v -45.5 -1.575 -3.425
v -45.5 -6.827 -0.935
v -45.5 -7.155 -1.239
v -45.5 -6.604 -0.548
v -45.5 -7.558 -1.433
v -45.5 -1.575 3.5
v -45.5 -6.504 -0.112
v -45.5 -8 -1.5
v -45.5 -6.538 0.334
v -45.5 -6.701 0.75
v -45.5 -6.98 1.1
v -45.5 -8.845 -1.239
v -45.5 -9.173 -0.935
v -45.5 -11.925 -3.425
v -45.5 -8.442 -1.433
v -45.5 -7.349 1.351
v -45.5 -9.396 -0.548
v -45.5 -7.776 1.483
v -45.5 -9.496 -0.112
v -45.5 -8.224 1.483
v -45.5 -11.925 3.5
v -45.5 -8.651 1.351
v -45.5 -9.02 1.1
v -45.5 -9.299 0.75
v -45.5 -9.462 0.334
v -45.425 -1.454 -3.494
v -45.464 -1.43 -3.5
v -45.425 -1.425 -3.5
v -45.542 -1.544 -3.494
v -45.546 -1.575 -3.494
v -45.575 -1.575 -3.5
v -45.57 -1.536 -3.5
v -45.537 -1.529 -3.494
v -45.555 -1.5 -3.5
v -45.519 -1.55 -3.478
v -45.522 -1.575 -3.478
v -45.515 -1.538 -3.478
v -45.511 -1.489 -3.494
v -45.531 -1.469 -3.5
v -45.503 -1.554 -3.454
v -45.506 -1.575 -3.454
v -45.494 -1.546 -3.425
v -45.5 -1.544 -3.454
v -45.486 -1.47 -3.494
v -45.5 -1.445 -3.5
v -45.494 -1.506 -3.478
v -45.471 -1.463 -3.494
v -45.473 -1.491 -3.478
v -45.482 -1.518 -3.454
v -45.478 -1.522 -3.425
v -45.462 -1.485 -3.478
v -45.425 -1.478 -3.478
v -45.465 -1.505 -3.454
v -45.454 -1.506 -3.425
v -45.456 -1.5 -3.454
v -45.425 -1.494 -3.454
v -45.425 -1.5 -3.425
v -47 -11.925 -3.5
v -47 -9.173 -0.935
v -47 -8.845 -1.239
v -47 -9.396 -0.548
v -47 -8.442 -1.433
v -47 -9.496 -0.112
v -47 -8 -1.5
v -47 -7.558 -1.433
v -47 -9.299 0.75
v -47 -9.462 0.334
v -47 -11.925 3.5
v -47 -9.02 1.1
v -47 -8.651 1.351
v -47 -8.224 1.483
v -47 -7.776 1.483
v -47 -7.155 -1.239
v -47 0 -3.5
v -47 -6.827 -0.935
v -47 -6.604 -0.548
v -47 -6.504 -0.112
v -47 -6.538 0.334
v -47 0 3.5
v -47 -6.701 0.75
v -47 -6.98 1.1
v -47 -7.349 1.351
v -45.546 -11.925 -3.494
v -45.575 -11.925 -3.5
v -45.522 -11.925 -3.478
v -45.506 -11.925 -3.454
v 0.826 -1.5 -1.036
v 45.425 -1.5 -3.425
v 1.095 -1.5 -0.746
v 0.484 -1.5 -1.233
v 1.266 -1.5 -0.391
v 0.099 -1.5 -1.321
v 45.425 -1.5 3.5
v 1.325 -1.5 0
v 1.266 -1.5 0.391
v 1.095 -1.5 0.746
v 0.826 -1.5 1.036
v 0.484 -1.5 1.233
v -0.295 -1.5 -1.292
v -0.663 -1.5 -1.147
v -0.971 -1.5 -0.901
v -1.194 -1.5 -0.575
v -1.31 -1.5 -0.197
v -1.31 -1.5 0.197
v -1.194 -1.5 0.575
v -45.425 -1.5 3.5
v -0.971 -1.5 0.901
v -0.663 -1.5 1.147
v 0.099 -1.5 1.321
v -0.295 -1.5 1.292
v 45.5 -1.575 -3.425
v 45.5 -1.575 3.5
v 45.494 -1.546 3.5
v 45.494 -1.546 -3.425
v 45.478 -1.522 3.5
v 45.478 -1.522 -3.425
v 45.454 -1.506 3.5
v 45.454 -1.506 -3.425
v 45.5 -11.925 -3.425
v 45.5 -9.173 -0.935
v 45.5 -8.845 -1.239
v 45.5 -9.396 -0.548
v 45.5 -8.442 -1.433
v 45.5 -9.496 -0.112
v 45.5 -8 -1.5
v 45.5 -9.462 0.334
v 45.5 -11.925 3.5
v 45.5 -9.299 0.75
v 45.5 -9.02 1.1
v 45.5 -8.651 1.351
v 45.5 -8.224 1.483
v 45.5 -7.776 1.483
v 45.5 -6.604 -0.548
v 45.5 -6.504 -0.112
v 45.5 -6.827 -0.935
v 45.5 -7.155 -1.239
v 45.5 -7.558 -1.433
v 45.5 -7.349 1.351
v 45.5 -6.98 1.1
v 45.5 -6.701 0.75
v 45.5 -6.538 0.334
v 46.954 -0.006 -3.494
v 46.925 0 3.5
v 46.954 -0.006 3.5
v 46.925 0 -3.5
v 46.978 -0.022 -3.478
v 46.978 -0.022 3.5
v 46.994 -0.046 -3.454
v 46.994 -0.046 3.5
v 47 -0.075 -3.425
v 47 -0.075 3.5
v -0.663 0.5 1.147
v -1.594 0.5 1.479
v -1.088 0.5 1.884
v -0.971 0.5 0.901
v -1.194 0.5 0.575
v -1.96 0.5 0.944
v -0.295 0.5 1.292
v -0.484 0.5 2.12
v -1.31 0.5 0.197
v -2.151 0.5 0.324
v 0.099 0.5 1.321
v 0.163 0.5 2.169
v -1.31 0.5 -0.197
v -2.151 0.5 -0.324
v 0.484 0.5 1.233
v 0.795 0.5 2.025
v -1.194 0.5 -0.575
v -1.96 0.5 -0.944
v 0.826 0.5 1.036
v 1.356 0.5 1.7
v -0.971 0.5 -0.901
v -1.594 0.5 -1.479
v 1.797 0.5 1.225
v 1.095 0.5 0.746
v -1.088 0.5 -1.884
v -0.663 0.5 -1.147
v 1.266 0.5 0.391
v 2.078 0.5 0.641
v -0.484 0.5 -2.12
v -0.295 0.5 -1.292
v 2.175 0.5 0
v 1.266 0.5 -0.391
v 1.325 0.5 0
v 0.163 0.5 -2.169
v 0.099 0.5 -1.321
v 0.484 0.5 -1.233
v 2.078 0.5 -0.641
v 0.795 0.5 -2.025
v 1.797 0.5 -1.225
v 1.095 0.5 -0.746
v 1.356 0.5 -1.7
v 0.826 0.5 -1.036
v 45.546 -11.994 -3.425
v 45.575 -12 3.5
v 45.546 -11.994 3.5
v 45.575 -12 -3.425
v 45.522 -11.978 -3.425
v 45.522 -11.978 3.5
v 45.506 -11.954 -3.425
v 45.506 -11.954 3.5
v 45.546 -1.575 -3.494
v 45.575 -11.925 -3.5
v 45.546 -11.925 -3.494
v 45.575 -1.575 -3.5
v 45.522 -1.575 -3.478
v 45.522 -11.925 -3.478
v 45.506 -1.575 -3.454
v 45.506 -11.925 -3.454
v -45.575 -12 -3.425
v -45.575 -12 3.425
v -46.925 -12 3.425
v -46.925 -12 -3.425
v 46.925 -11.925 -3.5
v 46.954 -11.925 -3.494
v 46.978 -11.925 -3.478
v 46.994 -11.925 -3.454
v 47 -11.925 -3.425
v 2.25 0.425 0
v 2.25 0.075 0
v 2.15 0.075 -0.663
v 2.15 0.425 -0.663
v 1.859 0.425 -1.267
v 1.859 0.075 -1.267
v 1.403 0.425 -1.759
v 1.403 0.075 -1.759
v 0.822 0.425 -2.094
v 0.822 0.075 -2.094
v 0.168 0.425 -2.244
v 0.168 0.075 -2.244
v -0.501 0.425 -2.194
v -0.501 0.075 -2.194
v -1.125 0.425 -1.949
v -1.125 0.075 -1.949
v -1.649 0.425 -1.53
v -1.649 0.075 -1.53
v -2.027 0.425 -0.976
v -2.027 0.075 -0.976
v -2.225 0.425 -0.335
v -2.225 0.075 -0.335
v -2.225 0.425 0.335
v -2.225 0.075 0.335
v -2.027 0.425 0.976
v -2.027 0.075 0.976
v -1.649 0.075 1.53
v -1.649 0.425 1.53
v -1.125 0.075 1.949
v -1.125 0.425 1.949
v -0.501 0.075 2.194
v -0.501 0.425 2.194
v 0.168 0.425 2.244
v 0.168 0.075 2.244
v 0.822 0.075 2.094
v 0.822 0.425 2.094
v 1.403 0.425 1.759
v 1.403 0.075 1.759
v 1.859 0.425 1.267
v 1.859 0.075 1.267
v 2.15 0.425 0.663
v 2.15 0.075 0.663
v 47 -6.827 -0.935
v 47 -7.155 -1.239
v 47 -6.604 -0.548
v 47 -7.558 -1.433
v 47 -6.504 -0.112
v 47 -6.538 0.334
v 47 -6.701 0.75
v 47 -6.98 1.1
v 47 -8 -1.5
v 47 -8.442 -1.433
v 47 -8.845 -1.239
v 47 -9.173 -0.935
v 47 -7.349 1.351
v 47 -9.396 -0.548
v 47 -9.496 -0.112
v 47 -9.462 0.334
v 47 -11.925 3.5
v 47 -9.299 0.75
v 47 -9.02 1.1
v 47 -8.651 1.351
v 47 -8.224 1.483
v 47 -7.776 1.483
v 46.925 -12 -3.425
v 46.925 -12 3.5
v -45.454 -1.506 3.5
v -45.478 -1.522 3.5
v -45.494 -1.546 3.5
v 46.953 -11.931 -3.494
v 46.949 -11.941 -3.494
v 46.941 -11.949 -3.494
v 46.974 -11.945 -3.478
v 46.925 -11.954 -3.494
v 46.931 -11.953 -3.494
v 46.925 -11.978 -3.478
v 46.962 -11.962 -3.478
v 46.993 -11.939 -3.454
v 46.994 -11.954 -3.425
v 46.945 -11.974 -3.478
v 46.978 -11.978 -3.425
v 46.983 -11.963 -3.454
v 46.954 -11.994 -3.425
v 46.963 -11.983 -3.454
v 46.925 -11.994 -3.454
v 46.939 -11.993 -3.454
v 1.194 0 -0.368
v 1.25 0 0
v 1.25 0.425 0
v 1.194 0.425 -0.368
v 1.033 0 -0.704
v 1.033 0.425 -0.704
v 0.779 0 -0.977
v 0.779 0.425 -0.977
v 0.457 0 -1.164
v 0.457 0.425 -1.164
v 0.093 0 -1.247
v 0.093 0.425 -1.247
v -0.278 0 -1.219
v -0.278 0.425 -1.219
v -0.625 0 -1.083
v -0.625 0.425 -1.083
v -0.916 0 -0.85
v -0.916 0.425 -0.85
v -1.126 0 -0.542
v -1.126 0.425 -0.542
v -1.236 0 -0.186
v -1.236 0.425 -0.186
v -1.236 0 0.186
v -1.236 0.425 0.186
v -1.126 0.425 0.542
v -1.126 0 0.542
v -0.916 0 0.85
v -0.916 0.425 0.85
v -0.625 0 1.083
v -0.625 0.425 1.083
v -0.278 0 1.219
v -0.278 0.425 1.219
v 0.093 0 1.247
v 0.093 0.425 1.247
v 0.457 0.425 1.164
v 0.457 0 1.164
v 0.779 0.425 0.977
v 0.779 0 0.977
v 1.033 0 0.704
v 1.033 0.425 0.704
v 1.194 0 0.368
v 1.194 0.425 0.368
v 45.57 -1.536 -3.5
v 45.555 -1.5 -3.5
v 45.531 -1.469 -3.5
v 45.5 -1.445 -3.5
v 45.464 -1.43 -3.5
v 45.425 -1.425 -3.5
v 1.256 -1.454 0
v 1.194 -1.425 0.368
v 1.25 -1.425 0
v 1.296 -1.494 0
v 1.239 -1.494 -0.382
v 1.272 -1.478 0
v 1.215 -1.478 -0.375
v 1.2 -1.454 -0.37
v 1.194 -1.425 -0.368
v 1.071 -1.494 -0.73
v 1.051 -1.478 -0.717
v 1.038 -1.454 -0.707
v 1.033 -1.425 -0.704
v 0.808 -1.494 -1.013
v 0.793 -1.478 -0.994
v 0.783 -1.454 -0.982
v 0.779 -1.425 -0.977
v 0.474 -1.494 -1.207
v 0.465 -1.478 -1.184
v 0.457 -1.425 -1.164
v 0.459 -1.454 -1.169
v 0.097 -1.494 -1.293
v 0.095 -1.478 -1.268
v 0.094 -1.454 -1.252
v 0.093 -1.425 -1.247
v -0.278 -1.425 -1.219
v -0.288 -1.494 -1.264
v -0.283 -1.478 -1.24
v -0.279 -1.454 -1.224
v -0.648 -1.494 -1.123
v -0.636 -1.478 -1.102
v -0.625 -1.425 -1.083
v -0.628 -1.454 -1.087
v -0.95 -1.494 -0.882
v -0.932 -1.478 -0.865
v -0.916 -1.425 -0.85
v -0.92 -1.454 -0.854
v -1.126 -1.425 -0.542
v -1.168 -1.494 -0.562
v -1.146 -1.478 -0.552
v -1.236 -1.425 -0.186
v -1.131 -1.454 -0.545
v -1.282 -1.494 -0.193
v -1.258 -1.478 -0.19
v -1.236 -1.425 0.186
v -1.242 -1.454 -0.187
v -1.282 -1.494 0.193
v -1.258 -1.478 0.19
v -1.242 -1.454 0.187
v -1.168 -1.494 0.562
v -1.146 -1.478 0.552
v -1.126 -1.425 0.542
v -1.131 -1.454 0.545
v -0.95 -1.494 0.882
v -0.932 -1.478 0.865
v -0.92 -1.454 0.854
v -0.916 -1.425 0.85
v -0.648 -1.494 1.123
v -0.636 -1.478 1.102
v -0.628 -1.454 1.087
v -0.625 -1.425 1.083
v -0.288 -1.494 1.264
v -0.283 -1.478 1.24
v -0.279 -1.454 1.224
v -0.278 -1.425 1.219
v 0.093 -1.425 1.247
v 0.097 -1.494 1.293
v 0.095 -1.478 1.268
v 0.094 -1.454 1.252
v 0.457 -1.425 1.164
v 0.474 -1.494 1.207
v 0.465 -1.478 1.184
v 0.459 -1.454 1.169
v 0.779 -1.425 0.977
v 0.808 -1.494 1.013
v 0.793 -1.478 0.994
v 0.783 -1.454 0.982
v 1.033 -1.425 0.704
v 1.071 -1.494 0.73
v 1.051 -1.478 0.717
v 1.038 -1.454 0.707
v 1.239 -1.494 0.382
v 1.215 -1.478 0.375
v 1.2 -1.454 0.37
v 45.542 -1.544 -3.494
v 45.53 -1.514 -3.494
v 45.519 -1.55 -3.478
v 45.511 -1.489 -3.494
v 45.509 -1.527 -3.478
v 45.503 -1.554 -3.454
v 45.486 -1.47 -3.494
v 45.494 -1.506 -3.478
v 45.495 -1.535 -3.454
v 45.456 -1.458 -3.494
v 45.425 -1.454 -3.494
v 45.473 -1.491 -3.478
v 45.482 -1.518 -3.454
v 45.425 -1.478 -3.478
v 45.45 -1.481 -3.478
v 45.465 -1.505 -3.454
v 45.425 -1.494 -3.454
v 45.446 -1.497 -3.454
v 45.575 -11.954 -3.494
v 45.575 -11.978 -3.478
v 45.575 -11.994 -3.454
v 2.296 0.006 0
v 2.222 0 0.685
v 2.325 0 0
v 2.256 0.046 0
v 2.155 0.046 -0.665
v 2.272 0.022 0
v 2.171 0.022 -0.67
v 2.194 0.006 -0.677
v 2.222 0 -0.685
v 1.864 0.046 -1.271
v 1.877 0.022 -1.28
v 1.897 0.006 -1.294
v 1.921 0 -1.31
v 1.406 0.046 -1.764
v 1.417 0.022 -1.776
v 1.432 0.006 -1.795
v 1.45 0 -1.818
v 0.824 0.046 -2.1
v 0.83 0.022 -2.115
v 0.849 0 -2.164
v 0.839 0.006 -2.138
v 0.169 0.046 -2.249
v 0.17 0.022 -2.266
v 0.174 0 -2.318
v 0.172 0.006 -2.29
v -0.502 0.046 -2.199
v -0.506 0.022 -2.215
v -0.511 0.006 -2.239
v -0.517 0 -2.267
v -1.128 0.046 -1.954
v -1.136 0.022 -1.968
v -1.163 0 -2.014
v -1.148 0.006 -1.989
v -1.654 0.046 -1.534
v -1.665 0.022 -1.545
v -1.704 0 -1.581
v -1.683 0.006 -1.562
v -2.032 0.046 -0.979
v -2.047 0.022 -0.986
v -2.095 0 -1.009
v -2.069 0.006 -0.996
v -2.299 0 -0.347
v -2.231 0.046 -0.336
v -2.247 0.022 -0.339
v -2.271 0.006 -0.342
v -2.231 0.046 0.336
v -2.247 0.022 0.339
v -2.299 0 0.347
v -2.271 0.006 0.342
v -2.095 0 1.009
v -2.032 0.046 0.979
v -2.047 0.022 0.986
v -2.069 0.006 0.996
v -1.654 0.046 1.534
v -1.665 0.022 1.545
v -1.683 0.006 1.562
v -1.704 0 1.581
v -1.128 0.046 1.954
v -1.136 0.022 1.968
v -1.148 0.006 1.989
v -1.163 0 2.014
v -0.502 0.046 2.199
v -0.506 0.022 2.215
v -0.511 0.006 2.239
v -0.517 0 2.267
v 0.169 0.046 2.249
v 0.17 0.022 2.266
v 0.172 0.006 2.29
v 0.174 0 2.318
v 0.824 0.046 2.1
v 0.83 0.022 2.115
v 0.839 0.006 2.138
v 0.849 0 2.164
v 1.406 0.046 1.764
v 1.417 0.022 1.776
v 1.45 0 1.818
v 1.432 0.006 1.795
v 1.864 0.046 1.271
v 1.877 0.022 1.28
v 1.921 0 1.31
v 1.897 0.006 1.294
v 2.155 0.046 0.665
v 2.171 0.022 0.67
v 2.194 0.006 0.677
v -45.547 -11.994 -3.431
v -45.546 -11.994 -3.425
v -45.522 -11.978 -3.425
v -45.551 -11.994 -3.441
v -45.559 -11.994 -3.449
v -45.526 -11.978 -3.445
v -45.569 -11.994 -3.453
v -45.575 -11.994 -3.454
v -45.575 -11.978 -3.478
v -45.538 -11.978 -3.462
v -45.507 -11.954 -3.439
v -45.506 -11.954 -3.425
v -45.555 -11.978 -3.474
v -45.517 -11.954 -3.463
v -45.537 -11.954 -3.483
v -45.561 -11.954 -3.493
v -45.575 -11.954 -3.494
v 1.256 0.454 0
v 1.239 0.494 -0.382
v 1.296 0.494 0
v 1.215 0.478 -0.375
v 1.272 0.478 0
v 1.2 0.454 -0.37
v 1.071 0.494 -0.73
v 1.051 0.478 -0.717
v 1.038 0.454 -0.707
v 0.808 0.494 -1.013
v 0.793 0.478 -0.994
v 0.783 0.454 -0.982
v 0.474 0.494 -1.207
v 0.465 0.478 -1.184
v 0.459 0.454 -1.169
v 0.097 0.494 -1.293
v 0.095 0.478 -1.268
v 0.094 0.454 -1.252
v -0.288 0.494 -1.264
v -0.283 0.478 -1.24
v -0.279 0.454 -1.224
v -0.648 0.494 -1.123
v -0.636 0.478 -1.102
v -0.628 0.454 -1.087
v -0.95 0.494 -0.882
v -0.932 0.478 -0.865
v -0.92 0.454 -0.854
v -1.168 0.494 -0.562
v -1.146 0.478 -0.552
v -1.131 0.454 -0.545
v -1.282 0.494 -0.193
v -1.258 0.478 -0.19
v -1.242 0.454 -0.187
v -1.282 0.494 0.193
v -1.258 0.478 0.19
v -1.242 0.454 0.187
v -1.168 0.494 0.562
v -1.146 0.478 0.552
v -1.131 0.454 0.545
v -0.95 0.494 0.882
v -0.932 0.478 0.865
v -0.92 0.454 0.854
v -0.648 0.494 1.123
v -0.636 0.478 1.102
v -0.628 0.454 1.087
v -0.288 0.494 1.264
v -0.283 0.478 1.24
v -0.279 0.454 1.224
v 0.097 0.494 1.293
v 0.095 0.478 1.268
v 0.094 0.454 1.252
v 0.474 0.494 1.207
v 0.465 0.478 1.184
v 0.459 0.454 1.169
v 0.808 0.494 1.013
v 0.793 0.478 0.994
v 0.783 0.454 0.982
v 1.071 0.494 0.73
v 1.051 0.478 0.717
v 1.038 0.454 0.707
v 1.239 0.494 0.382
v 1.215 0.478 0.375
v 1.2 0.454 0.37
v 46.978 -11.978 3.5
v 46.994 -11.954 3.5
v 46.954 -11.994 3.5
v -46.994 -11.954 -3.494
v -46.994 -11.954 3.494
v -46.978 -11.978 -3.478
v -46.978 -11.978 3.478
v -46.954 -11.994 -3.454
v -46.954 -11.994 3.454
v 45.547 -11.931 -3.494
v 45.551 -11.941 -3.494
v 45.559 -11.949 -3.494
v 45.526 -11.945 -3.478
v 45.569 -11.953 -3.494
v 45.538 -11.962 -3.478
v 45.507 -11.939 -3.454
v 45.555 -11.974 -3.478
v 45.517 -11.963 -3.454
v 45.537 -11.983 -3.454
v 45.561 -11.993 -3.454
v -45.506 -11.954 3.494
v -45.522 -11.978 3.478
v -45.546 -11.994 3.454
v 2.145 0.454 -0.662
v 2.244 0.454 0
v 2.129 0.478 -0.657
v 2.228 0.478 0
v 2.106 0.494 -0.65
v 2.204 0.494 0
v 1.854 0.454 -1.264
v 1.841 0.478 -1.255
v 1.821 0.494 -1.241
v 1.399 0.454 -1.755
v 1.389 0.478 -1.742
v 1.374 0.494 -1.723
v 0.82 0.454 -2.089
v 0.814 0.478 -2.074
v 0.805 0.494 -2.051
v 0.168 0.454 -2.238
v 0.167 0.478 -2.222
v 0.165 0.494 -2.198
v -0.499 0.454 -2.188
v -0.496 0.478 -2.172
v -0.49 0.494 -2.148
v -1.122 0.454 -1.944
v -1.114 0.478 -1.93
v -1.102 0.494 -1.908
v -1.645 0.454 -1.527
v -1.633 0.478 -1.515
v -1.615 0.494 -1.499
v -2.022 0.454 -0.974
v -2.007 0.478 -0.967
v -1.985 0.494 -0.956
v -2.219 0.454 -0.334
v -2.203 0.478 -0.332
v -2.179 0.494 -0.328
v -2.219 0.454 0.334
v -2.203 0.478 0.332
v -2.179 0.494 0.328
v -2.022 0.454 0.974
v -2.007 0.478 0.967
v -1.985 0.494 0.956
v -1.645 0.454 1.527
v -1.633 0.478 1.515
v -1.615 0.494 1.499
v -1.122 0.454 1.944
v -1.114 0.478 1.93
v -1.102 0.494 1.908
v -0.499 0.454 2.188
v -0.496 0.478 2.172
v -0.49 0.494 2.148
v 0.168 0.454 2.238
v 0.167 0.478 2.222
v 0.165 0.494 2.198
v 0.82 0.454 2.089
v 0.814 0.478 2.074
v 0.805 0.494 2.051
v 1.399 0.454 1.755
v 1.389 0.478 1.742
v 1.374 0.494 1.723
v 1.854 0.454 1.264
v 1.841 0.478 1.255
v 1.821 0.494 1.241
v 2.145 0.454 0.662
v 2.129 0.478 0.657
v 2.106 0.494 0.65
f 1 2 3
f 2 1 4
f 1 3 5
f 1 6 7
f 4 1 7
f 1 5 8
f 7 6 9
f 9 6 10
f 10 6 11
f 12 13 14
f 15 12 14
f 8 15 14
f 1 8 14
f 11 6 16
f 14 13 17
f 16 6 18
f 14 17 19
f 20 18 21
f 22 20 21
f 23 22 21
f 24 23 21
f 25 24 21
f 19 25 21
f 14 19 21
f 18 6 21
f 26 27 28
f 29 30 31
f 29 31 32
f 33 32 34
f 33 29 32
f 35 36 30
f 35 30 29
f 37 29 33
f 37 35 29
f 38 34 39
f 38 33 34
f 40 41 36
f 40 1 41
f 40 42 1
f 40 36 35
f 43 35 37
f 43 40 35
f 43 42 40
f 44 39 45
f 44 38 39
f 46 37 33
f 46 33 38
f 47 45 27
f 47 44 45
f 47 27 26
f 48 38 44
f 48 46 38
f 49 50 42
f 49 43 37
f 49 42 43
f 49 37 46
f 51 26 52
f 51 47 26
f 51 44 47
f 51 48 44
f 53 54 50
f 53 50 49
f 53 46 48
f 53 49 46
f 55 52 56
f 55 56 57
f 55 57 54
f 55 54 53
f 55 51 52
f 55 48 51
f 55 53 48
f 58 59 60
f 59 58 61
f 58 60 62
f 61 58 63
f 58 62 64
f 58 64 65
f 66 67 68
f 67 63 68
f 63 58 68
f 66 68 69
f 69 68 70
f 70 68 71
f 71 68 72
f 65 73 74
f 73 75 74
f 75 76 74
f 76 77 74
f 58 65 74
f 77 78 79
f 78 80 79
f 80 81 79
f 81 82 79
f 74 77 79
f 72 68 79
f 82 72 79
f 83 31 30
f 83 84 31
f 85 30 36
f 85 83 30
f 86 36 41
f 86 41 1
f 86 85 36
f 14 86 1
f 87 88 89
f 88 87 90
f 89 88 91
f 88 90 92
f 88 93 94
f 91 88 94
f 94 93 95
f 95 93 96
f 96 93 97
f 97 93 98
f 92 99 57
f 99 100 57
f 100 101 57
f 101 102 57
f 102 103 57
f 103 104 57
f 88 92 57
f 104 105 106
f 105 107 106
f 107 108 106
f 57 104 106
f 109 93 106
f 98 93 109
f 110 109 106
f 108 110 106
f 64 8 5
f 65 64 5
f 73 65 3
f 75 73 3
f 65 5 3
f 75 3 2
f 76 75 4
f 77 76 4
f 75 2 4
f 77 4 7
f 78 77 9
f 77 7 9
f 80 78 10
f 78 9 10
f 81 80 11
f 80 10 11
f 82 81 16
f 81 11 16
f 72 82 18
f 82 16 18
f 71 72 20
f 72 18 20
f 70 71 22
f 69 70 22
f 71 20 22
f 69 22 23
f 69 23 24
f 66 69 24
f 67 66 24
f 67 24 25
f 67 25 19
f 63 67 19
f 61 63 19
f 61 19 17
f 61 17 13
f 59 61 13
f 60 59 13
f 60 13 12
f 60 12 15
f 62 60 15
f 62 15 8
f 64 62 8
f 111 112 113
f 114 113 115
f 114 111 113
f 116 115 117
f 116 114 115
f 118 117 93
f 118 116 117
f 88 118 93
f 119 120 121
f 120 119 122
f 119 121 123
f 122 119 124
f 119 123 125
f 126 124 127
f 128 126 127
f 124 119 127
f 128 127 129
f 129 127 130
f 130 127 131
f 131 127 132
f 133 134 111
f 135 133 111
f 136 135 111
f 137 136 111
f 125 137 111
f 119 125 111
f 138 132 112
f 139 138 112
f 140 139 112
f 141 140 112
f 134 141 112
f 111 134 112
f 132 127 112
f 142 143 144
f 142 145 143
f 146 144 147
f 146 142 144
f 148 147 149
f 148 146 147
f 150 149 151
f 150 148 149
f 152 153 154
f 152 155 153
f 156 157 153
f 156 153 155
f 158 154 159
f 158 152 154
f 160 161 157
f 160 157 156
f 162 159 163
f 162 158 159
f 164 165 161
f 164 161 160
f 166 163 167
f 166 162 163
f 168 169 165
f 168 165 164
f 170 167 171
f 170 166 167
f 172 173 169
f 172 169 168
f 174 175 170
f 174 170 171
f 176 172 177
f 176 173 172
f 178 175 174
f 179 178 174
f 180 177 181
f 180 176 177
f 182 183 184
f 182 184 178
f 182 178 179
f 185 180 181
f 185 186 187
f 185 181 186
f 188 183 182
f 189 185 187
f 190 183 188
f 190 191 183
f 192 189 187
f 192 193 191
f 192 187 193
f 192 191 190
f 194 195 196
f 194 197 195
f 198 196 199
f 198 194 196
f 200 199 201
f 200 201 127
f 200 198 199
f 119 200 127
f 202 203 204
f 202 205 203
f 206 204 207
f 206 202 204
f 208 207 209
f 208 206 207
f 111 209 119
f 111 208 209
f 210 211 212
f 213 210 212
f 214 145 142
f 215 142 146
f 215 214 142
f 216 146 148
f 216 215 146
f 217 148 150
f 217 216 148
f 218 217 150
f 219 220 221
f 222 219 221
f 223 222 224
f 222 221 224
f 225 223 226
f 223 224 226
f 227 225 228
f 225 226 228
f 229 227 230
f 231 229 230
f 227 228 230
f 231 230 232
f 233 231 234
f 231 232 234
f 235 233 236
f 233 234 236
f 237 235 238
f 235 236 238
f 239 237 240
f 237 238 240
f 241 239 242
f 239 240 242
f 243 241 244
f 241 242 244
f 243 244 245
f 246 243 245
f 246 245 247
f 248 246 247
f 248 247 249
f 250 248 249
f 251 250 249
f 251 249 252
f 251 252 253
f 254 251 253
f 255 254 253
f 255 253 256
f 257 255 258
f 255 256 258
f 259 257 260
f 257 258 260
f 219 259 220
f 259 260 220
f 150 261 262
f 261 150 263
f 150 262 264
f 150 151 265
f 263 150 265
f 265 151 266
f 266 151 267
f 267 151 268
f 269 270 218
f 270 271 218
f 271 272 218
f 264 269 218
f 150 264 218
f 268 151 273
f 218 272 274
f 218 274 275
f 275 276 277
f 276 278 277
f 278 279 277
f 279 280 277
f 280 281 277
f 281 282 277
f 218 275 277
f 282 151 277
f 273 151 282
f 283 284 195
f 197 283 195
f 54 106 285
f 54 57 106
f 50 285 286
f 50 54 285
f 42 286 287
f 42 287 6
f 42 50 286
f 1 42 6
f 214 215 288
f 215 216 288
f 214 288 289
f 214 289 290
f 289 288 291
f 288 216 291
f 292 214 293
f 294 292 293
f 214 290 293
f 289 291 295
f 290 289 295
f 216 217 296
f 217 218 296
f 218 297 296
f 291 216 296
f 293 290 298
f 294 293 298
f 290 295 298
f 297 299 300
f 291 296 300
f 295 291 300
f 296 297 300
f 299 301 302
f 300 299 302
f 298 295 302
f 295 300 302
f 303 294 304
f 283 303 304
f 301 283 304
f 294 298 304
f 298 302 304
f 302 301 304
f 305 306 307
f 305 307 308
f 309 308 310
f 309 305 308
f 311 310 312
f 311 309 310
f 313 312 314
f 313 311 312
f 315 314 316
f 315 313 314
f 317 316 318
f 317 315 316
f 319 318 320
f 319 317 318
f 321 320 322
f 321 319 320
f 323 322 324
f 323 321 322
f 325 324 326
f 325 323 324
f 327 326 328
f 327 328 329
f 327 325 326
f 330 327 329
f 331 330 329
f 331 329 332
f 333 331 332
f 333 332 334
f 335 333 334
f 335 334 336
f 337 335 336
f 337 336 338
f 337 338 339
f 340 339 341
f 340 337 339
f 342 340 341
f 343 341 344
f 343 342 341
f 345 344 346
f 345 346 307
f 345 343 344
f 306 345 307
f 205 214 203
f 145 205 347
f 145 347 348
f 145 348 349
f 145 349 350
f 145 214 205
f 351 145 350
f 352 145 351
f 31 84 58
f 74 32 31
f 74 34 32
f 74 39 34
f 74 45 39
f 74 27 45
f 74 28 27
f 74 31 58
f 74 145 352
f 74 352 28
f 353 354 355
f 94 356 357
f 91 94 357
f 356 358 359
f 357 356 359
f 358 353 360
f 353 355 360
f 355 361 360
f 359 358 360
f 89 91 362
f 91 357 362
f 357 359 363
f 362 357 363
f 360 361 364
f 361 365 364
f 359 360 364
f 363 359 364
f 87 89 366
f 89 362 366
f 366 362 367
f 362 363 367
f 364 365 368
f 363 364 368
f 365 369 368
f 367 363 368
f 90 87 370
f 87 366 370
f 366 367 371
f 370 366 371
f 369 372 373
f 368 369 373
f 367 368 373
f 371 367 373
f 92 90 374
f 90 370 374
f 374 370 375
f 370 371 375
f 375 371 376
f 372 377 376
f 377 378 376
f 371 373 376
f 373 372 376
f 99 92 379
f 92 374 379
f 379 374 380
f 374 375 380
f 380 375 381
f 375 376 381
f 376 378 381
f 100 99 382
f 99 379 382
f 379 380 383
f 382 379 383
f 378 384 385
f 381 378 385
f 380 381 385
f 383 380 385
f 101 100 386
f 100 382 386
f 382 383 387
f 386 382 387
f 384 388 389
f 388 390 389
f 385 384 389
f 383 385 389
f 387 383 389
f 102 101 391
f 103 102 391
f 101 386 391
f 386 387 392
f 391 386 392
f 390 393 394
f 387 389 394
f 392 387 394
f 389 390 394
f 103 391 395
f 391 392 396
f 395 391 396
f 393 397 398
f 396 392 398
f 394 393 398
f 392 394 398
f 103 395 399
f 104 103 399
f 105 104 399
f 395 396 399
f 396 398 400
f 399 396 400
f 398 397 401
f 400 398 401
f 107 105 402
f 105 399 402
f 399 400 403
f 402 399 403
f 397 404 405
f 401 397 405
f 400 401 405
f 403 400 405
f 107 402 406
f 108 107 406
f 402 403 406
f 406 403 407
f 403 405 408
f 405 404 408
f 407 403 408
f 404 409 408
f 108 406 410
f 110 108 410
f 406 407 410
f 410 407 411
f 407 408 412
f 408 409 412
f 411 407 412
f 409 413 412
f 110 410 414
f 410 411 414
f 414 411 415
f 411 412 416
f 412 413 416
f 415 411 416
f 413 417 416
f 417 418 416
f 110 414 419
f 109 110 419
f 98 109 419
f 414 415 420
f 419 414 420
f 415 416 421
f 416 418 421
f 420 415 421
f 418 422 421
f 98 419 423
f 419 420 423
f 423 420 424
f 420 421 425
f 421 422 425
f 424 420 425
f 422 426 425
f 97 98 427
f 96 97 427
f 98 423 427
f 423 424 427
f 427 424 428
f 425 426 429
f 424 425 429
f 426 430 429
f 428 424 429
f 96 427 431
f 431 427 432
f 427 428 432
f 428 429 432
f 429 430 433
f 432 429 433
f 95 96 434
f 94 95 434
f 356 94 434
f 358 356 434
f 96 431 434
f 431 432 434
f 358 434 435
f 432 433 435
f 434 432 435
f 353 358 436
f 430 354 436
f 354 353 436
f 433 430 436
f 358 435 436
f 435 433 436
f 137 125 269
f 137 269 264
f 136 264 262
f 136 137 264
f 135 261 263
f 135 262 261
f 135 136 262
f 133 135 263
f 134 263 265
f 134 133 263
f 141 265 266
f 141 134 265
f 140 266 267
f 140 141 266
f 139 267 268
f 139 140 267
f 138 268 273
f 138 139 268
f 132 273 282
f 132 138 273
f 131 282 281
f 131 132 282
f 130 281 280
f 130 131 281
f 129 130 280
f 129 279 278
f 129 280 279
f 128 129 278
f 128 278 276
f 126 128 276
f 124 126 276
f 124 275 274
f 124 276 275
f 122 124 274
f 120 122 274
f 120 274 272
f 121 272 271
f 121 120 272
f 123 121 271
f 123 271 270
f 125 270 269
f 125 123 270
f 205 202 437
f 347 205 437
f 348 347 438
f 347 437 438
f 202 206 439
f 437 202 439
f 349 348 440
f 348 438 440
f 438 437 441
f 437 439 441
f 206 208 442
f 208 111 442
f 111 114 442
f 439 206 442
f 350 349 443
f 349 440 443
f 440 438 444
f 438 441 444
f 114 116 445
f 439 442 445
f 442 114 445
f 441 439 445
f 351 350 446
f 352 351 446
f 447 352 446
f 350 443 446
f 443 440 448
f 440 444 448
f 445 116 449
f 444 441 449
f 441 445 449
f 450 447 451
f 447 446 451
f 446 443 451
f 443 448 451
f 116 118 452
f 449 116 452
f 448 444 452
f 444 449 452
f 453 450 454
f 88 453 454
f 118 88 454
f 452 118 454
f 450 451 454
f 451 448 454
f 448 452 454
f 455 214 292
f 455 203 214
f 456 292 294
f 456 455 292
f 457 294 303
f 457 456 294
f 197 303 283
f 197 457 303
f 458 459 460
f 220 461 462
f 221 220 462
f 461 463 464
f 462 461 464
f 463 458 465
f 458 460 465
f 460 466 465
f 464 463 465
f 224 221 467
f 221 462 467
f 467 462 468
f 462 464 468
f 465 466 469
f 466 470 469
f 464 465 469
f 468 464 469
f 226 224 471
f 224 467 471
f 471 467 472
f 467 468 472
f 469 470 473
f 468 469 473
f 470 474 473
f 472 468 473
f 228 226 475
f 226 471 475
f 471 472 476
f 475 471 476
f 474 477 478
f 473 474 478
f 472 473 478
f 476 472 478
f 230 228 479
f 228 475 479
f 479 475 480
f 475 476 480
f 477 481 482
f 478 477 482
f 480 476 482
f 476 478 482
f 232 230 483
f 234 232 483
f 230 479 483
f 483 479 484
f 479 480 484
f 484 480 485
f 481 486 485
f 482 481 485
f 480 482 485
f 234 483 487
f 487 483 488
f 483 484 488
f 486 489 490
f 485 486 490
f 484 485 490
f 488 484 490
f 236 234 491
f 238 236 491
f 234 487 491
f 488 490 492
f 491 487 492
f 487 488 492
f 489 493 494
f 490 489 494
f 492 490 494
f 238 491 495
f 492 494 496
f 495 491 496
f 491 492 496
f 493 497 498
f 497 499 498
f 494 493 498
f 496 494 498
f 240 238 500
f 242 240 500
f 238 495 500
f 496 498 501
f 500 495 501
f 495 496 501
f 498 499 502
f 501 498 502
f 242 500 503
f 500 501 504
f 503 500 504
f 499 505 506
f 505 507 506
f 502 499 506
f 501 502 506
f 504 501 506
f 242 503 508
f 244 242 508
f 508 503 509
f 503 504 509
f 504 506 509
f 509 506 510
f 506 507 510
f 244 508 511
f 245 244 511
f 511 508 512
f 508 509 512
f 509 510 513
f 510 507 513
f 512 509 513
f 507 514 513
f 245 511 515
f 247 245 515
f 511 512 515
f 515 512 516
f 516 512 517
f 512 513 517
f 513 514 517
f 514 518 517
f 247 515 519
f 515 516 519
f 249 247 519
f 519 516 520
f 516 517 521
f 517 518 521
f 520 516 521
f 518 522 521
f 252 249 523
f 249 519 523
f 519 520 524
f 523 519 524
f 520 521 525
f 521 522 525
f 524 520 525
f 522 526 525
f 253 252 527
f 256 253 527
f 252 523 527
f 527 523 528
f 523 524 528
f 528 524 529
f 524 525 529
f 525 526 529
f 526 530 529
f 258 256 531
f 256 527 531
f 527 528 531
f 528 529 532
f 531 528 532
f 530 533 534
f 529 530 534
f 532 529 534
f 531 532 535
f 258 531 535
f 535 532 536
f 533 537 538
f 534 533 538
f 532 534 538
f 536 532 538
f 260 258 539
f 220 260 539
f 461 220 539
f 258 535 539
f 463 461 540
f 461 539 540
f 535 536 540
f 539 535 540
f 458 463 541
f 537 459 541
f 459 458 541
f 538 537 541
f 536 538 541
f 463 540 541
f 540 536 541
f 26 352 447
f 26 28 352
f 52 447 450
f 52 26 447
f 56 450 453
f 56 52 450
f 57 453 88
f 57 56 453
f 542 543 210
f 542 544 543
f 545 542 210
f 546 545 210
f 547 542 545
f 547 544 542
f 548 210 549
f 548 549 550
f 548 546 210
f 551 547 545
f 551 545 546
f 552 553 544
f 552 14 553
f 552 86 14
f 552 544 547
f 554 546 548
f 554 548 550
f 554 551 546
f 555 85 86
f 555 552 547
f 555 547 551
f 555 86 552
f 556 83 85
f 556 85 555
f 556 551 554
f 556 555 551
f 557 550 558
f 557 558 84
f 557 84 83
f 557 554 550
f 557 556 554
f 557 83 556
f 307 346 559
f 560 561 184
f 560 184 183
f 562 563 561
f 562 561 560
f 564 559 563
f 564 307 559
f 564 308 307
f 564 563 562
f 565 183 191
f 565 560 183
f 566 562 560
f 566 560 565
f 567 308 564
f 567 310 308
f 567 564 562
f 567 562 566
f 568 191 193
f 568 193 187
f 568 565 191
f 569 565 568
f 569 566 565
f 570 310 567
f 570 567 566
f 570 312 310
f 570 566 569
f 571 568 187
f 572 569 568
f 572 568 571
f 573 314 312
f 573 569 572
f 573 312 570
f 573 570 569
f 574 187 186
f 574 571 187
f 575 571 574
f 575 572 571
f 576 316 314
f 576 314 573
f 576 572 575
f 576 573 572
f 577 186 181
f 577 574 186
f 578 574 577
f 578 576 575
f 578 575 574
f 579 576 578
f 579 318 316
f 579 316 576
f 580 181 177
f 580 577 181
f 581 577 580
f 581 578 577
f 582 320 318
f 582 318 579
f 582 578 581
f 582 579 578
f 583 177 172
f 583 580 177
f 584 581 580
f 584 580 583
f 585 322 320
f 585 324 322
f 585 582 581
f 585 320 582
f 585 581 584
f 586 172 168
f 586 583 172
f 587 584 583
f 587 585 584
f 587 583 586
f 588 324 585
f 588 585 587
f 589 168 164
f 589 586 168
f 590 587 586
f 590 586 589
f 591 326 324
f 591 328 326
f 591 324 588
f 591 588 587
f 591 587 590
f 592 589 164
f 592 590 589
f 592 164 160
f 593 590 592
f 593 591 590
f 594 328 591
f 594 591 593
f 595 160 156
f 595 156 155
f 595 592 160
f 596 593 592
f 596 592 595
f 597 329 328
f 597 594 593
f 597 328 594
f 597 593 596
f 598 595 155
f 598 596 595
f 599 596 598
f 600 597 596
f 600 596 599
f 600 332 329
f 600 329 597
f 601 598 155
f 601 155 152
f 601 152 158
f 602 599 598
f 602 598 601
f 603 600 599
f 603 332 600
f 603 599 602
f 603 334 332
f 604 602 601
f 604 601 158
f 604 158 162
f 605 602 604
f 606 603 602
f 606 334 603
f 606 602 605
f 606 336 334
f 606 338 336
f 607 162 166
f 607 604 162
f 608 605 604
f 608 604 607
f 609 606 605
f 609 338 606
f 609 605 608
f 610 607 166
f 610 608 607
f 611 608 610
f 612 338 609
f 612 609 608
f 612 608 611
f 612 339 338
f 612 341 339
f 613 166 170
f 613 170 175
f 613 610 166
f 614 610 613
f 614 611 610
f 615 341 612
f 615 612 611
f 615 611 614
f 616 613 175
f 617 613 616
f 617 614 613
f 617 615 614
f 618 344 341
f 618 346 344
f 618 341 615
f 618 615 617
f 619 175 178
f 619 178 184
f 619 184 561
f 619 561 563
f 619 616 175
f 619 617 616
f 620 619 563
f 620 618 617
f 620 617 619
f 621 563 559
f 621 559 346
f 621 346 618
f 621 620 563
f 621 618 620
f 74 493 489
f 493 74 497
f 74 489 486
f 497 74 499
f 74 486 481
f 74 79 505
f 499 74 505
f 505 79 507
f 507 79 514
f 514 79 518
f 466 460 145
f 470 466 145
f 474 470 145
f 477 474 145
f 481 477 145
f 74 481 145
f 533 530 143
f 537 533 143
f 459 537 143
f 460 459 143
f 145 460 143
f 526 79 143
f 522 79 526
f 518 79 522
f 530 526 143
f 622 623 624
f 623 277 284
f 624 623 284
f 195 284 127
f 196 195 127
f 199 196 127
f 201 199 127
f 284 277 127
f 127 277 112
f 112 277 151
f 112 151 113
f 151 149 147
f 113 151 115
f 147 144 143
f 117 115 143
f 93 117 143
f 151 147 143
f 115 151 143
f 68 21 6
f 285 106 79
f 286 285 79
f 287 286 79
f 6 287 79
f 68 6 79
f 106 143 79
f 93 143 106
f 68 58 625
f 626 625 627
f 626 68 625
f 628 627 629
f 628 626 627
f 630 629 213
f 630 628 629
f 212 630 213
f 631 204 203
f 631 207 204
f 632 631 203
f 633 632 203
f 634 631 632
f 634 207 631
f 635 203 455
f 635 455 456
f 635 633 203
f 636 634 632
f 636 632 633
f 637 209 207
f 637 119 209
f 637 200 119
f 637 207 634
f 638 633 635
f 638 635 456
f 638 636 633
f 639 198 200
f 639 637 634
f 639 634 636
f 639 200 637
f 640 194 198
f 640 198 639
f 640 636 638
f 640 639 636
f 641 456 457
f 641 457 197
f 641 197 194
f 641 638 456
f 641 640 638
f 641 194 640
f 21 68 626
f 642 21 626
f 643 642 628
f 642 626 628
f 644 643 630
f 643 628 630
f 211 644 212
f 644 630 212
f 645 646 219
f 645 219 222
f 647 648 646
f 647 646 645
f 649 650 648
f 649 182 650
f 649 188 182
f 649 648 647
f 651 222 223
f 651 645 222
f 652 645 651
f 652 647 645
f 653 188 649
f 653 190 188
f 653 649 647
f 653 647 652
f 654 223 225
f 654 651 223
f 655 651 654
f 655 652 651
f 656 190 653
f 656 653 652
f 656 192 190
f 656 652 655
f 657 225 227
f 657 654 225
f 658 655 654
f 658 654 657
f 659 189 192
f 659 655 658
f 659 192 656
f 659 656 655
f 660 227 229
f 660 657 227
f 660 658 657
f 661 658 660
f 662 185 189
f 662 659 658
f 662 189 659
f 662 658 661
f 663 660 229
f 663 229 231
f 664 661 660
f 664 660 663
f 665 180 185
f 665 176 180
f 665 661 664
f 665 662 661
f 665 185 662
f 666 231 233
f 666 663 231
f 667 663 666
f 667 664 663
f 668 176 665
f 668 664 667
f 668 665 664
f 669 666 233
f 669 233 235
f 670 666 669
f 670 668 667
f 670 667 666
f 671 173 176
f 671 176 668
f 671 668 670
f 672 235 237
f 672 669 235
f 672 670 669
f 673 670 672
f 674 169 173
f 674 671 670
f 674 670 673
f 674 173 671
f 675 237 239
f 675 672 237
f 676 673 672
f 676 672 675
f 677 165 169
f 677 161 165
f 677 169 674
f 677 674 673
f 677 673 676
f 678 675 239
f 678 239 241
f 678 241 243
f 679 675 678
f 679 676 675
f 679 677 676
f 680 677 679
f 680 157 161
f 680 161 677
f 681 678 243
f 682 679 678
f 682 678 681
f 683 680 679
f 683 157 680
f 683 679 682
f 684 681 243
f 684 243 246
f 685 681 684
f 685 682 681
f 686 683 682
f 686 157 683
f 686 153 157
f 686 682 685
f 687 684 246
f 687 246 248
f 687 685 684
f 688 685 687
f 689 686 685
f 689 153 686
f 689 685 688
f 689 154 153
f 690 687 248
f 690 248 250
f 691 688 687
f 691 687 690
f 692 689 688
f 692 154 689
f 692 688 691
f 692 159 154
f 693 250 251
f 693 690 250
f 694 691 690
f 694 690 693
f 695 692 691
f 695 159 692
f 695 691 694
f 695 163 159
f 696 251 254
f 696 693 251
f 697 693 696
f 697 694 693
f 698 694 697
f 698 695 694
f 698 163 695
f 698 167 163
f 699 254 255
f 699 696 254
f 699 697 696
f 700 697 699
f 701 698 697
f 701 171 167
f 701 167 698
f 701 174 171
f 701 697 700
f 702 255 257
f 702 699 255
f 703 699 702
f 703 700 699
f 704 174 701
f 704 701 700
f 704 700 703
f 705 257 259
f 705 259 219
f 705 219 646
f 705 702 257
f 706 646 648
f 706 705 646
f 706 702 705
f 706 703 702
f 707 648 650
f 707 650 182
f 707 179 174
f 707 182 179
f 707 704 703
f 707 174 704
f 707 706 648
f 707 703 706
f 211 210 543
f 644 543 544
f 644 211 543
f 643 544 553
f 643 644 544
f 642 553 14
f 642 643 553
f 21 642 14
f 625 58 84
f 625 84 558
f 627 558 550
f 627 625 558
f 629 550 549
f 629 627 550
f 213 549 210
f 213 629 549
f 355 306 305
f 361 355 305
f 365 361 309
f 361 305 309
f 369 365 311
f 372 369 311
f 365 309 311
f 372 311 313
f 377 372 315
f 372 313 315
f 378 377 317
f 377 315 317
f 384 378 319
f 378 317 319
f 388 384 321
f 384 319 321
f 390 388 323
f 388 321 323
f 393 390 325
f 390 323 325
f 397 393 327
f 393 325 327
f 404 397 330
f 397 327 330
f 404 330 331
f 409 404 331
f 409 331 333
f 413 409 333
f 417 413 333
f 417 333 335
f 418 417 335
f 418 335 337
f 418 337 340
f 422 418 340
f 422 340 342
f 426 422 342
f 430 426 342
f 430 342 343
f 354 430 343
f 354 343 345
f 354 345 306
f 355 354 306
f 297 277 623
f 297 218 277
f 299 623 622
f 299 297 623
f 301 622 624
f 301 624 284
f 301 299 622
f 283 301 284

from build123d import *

# Parameters (mm, degrees)
BOSS_EXTRUDE1_DEPTH     = 3.5
SKETCH2_R               = 1.25
CUT_EXTRUDE1_DEPTH      = 13
SKETCH3_R               = 2.25
SKETCH3_R_2             = 1.25
BOSS_EXTRUDE2_DEPTH     = 0.5
SKETCH4_R               = 1.5
CUT_EXTRUDE2_DEPTH      = 48
CUT_EXTRUDE2_DEPTH_BACK = 48
FILLET1_R               = 0.075


with BuildPart() as part:
    # Sketch1 → Boss-Extrude1 (new body, symmetric)
    with BuildSketch(Plane.XY):
        Polygon((-47, 0), (47, 0), (47, -12), (45.5, -12), (45.5, -1.5), (-45.5, -1.5), (-45.5, -12), (-47, -12), align=None)
    extrude(amount=BOSS_EXTRUDE1_DEPTH, both=True)

    # Sketch2 → Cut-Extrude1 (cut, through all)
    with BuildSketch(Plane(origin=(0, 0, 0), x_dir=(1, 0, 0), z_dir=(0, 1, 0))):
        Circle(SKETCH2_R)
    extrude(amount=-CUT_EXTRUDE1_DEPTH, mode=Mode.SUBTRACT)

    # Sketch3 → Boss-Extrude2 (add)
    with BuildSketch(Plane(origin=(0, 0, 0), x_dir=(1, 0, 0), z_dir=(0, 1, 0))):
        Circle(SKETCH3_R)
        Circle(SKETCH3_R_2, mode=Mode.SUBTRACT)
    extrude(amount=BOSS_EXTRUDE2_DEPTH)

    # Sketch4 → Cut-Extrude2 (cut, two sides)
    with BuildSketch(Plane(origin=(0, 0, 0), x_dir=(0, 0, -1), z_dir=(1, 0, 0))) as cut_extrude2_sk:
        with Locations((0, -8)):
            Circle(SKETCH4_R)
    extrude(amount=CUT_EXTRUDE2_DEPTH, mode=Mode.SUBTRACT)
    extrude(cut_extrude2_sk.sketch, amount=-CUT_EXTRUDE2_DEPTH_BACK, mode=Mode.SUBTRACT)

    # Fillet1
    fillet1_edges = [part.edges().sort_by_distance(p)[0] for p in [
        (-45.5, -6.75, -3.5),
        (0, -1.5, -3.5),
        (-2.25, 0, 0),
        (47, -12, 0),
        (47, 0, 0),
        (-47, -12, 0),
        (-45.5, -12, 0),
        (-45.5, -1.5, 0),
        (45.5, -1.5, 0),
        (45.5, -12, 0),
        (-46.25, -12, 3.5),
        (45.5, -6.75, -3.5),
        (-46.25, -12, -3.5),
        (47, -6, -3.5),
        (46.25, -12, -3.5),
        (-1.25, -1.5, 0),
        (-2.25, 0.5, 0),
        (-1.25, 0.5, 0),
    ]]
    fillet(fillet1_edges, radius=FILLET1_R)


solid = part.part
